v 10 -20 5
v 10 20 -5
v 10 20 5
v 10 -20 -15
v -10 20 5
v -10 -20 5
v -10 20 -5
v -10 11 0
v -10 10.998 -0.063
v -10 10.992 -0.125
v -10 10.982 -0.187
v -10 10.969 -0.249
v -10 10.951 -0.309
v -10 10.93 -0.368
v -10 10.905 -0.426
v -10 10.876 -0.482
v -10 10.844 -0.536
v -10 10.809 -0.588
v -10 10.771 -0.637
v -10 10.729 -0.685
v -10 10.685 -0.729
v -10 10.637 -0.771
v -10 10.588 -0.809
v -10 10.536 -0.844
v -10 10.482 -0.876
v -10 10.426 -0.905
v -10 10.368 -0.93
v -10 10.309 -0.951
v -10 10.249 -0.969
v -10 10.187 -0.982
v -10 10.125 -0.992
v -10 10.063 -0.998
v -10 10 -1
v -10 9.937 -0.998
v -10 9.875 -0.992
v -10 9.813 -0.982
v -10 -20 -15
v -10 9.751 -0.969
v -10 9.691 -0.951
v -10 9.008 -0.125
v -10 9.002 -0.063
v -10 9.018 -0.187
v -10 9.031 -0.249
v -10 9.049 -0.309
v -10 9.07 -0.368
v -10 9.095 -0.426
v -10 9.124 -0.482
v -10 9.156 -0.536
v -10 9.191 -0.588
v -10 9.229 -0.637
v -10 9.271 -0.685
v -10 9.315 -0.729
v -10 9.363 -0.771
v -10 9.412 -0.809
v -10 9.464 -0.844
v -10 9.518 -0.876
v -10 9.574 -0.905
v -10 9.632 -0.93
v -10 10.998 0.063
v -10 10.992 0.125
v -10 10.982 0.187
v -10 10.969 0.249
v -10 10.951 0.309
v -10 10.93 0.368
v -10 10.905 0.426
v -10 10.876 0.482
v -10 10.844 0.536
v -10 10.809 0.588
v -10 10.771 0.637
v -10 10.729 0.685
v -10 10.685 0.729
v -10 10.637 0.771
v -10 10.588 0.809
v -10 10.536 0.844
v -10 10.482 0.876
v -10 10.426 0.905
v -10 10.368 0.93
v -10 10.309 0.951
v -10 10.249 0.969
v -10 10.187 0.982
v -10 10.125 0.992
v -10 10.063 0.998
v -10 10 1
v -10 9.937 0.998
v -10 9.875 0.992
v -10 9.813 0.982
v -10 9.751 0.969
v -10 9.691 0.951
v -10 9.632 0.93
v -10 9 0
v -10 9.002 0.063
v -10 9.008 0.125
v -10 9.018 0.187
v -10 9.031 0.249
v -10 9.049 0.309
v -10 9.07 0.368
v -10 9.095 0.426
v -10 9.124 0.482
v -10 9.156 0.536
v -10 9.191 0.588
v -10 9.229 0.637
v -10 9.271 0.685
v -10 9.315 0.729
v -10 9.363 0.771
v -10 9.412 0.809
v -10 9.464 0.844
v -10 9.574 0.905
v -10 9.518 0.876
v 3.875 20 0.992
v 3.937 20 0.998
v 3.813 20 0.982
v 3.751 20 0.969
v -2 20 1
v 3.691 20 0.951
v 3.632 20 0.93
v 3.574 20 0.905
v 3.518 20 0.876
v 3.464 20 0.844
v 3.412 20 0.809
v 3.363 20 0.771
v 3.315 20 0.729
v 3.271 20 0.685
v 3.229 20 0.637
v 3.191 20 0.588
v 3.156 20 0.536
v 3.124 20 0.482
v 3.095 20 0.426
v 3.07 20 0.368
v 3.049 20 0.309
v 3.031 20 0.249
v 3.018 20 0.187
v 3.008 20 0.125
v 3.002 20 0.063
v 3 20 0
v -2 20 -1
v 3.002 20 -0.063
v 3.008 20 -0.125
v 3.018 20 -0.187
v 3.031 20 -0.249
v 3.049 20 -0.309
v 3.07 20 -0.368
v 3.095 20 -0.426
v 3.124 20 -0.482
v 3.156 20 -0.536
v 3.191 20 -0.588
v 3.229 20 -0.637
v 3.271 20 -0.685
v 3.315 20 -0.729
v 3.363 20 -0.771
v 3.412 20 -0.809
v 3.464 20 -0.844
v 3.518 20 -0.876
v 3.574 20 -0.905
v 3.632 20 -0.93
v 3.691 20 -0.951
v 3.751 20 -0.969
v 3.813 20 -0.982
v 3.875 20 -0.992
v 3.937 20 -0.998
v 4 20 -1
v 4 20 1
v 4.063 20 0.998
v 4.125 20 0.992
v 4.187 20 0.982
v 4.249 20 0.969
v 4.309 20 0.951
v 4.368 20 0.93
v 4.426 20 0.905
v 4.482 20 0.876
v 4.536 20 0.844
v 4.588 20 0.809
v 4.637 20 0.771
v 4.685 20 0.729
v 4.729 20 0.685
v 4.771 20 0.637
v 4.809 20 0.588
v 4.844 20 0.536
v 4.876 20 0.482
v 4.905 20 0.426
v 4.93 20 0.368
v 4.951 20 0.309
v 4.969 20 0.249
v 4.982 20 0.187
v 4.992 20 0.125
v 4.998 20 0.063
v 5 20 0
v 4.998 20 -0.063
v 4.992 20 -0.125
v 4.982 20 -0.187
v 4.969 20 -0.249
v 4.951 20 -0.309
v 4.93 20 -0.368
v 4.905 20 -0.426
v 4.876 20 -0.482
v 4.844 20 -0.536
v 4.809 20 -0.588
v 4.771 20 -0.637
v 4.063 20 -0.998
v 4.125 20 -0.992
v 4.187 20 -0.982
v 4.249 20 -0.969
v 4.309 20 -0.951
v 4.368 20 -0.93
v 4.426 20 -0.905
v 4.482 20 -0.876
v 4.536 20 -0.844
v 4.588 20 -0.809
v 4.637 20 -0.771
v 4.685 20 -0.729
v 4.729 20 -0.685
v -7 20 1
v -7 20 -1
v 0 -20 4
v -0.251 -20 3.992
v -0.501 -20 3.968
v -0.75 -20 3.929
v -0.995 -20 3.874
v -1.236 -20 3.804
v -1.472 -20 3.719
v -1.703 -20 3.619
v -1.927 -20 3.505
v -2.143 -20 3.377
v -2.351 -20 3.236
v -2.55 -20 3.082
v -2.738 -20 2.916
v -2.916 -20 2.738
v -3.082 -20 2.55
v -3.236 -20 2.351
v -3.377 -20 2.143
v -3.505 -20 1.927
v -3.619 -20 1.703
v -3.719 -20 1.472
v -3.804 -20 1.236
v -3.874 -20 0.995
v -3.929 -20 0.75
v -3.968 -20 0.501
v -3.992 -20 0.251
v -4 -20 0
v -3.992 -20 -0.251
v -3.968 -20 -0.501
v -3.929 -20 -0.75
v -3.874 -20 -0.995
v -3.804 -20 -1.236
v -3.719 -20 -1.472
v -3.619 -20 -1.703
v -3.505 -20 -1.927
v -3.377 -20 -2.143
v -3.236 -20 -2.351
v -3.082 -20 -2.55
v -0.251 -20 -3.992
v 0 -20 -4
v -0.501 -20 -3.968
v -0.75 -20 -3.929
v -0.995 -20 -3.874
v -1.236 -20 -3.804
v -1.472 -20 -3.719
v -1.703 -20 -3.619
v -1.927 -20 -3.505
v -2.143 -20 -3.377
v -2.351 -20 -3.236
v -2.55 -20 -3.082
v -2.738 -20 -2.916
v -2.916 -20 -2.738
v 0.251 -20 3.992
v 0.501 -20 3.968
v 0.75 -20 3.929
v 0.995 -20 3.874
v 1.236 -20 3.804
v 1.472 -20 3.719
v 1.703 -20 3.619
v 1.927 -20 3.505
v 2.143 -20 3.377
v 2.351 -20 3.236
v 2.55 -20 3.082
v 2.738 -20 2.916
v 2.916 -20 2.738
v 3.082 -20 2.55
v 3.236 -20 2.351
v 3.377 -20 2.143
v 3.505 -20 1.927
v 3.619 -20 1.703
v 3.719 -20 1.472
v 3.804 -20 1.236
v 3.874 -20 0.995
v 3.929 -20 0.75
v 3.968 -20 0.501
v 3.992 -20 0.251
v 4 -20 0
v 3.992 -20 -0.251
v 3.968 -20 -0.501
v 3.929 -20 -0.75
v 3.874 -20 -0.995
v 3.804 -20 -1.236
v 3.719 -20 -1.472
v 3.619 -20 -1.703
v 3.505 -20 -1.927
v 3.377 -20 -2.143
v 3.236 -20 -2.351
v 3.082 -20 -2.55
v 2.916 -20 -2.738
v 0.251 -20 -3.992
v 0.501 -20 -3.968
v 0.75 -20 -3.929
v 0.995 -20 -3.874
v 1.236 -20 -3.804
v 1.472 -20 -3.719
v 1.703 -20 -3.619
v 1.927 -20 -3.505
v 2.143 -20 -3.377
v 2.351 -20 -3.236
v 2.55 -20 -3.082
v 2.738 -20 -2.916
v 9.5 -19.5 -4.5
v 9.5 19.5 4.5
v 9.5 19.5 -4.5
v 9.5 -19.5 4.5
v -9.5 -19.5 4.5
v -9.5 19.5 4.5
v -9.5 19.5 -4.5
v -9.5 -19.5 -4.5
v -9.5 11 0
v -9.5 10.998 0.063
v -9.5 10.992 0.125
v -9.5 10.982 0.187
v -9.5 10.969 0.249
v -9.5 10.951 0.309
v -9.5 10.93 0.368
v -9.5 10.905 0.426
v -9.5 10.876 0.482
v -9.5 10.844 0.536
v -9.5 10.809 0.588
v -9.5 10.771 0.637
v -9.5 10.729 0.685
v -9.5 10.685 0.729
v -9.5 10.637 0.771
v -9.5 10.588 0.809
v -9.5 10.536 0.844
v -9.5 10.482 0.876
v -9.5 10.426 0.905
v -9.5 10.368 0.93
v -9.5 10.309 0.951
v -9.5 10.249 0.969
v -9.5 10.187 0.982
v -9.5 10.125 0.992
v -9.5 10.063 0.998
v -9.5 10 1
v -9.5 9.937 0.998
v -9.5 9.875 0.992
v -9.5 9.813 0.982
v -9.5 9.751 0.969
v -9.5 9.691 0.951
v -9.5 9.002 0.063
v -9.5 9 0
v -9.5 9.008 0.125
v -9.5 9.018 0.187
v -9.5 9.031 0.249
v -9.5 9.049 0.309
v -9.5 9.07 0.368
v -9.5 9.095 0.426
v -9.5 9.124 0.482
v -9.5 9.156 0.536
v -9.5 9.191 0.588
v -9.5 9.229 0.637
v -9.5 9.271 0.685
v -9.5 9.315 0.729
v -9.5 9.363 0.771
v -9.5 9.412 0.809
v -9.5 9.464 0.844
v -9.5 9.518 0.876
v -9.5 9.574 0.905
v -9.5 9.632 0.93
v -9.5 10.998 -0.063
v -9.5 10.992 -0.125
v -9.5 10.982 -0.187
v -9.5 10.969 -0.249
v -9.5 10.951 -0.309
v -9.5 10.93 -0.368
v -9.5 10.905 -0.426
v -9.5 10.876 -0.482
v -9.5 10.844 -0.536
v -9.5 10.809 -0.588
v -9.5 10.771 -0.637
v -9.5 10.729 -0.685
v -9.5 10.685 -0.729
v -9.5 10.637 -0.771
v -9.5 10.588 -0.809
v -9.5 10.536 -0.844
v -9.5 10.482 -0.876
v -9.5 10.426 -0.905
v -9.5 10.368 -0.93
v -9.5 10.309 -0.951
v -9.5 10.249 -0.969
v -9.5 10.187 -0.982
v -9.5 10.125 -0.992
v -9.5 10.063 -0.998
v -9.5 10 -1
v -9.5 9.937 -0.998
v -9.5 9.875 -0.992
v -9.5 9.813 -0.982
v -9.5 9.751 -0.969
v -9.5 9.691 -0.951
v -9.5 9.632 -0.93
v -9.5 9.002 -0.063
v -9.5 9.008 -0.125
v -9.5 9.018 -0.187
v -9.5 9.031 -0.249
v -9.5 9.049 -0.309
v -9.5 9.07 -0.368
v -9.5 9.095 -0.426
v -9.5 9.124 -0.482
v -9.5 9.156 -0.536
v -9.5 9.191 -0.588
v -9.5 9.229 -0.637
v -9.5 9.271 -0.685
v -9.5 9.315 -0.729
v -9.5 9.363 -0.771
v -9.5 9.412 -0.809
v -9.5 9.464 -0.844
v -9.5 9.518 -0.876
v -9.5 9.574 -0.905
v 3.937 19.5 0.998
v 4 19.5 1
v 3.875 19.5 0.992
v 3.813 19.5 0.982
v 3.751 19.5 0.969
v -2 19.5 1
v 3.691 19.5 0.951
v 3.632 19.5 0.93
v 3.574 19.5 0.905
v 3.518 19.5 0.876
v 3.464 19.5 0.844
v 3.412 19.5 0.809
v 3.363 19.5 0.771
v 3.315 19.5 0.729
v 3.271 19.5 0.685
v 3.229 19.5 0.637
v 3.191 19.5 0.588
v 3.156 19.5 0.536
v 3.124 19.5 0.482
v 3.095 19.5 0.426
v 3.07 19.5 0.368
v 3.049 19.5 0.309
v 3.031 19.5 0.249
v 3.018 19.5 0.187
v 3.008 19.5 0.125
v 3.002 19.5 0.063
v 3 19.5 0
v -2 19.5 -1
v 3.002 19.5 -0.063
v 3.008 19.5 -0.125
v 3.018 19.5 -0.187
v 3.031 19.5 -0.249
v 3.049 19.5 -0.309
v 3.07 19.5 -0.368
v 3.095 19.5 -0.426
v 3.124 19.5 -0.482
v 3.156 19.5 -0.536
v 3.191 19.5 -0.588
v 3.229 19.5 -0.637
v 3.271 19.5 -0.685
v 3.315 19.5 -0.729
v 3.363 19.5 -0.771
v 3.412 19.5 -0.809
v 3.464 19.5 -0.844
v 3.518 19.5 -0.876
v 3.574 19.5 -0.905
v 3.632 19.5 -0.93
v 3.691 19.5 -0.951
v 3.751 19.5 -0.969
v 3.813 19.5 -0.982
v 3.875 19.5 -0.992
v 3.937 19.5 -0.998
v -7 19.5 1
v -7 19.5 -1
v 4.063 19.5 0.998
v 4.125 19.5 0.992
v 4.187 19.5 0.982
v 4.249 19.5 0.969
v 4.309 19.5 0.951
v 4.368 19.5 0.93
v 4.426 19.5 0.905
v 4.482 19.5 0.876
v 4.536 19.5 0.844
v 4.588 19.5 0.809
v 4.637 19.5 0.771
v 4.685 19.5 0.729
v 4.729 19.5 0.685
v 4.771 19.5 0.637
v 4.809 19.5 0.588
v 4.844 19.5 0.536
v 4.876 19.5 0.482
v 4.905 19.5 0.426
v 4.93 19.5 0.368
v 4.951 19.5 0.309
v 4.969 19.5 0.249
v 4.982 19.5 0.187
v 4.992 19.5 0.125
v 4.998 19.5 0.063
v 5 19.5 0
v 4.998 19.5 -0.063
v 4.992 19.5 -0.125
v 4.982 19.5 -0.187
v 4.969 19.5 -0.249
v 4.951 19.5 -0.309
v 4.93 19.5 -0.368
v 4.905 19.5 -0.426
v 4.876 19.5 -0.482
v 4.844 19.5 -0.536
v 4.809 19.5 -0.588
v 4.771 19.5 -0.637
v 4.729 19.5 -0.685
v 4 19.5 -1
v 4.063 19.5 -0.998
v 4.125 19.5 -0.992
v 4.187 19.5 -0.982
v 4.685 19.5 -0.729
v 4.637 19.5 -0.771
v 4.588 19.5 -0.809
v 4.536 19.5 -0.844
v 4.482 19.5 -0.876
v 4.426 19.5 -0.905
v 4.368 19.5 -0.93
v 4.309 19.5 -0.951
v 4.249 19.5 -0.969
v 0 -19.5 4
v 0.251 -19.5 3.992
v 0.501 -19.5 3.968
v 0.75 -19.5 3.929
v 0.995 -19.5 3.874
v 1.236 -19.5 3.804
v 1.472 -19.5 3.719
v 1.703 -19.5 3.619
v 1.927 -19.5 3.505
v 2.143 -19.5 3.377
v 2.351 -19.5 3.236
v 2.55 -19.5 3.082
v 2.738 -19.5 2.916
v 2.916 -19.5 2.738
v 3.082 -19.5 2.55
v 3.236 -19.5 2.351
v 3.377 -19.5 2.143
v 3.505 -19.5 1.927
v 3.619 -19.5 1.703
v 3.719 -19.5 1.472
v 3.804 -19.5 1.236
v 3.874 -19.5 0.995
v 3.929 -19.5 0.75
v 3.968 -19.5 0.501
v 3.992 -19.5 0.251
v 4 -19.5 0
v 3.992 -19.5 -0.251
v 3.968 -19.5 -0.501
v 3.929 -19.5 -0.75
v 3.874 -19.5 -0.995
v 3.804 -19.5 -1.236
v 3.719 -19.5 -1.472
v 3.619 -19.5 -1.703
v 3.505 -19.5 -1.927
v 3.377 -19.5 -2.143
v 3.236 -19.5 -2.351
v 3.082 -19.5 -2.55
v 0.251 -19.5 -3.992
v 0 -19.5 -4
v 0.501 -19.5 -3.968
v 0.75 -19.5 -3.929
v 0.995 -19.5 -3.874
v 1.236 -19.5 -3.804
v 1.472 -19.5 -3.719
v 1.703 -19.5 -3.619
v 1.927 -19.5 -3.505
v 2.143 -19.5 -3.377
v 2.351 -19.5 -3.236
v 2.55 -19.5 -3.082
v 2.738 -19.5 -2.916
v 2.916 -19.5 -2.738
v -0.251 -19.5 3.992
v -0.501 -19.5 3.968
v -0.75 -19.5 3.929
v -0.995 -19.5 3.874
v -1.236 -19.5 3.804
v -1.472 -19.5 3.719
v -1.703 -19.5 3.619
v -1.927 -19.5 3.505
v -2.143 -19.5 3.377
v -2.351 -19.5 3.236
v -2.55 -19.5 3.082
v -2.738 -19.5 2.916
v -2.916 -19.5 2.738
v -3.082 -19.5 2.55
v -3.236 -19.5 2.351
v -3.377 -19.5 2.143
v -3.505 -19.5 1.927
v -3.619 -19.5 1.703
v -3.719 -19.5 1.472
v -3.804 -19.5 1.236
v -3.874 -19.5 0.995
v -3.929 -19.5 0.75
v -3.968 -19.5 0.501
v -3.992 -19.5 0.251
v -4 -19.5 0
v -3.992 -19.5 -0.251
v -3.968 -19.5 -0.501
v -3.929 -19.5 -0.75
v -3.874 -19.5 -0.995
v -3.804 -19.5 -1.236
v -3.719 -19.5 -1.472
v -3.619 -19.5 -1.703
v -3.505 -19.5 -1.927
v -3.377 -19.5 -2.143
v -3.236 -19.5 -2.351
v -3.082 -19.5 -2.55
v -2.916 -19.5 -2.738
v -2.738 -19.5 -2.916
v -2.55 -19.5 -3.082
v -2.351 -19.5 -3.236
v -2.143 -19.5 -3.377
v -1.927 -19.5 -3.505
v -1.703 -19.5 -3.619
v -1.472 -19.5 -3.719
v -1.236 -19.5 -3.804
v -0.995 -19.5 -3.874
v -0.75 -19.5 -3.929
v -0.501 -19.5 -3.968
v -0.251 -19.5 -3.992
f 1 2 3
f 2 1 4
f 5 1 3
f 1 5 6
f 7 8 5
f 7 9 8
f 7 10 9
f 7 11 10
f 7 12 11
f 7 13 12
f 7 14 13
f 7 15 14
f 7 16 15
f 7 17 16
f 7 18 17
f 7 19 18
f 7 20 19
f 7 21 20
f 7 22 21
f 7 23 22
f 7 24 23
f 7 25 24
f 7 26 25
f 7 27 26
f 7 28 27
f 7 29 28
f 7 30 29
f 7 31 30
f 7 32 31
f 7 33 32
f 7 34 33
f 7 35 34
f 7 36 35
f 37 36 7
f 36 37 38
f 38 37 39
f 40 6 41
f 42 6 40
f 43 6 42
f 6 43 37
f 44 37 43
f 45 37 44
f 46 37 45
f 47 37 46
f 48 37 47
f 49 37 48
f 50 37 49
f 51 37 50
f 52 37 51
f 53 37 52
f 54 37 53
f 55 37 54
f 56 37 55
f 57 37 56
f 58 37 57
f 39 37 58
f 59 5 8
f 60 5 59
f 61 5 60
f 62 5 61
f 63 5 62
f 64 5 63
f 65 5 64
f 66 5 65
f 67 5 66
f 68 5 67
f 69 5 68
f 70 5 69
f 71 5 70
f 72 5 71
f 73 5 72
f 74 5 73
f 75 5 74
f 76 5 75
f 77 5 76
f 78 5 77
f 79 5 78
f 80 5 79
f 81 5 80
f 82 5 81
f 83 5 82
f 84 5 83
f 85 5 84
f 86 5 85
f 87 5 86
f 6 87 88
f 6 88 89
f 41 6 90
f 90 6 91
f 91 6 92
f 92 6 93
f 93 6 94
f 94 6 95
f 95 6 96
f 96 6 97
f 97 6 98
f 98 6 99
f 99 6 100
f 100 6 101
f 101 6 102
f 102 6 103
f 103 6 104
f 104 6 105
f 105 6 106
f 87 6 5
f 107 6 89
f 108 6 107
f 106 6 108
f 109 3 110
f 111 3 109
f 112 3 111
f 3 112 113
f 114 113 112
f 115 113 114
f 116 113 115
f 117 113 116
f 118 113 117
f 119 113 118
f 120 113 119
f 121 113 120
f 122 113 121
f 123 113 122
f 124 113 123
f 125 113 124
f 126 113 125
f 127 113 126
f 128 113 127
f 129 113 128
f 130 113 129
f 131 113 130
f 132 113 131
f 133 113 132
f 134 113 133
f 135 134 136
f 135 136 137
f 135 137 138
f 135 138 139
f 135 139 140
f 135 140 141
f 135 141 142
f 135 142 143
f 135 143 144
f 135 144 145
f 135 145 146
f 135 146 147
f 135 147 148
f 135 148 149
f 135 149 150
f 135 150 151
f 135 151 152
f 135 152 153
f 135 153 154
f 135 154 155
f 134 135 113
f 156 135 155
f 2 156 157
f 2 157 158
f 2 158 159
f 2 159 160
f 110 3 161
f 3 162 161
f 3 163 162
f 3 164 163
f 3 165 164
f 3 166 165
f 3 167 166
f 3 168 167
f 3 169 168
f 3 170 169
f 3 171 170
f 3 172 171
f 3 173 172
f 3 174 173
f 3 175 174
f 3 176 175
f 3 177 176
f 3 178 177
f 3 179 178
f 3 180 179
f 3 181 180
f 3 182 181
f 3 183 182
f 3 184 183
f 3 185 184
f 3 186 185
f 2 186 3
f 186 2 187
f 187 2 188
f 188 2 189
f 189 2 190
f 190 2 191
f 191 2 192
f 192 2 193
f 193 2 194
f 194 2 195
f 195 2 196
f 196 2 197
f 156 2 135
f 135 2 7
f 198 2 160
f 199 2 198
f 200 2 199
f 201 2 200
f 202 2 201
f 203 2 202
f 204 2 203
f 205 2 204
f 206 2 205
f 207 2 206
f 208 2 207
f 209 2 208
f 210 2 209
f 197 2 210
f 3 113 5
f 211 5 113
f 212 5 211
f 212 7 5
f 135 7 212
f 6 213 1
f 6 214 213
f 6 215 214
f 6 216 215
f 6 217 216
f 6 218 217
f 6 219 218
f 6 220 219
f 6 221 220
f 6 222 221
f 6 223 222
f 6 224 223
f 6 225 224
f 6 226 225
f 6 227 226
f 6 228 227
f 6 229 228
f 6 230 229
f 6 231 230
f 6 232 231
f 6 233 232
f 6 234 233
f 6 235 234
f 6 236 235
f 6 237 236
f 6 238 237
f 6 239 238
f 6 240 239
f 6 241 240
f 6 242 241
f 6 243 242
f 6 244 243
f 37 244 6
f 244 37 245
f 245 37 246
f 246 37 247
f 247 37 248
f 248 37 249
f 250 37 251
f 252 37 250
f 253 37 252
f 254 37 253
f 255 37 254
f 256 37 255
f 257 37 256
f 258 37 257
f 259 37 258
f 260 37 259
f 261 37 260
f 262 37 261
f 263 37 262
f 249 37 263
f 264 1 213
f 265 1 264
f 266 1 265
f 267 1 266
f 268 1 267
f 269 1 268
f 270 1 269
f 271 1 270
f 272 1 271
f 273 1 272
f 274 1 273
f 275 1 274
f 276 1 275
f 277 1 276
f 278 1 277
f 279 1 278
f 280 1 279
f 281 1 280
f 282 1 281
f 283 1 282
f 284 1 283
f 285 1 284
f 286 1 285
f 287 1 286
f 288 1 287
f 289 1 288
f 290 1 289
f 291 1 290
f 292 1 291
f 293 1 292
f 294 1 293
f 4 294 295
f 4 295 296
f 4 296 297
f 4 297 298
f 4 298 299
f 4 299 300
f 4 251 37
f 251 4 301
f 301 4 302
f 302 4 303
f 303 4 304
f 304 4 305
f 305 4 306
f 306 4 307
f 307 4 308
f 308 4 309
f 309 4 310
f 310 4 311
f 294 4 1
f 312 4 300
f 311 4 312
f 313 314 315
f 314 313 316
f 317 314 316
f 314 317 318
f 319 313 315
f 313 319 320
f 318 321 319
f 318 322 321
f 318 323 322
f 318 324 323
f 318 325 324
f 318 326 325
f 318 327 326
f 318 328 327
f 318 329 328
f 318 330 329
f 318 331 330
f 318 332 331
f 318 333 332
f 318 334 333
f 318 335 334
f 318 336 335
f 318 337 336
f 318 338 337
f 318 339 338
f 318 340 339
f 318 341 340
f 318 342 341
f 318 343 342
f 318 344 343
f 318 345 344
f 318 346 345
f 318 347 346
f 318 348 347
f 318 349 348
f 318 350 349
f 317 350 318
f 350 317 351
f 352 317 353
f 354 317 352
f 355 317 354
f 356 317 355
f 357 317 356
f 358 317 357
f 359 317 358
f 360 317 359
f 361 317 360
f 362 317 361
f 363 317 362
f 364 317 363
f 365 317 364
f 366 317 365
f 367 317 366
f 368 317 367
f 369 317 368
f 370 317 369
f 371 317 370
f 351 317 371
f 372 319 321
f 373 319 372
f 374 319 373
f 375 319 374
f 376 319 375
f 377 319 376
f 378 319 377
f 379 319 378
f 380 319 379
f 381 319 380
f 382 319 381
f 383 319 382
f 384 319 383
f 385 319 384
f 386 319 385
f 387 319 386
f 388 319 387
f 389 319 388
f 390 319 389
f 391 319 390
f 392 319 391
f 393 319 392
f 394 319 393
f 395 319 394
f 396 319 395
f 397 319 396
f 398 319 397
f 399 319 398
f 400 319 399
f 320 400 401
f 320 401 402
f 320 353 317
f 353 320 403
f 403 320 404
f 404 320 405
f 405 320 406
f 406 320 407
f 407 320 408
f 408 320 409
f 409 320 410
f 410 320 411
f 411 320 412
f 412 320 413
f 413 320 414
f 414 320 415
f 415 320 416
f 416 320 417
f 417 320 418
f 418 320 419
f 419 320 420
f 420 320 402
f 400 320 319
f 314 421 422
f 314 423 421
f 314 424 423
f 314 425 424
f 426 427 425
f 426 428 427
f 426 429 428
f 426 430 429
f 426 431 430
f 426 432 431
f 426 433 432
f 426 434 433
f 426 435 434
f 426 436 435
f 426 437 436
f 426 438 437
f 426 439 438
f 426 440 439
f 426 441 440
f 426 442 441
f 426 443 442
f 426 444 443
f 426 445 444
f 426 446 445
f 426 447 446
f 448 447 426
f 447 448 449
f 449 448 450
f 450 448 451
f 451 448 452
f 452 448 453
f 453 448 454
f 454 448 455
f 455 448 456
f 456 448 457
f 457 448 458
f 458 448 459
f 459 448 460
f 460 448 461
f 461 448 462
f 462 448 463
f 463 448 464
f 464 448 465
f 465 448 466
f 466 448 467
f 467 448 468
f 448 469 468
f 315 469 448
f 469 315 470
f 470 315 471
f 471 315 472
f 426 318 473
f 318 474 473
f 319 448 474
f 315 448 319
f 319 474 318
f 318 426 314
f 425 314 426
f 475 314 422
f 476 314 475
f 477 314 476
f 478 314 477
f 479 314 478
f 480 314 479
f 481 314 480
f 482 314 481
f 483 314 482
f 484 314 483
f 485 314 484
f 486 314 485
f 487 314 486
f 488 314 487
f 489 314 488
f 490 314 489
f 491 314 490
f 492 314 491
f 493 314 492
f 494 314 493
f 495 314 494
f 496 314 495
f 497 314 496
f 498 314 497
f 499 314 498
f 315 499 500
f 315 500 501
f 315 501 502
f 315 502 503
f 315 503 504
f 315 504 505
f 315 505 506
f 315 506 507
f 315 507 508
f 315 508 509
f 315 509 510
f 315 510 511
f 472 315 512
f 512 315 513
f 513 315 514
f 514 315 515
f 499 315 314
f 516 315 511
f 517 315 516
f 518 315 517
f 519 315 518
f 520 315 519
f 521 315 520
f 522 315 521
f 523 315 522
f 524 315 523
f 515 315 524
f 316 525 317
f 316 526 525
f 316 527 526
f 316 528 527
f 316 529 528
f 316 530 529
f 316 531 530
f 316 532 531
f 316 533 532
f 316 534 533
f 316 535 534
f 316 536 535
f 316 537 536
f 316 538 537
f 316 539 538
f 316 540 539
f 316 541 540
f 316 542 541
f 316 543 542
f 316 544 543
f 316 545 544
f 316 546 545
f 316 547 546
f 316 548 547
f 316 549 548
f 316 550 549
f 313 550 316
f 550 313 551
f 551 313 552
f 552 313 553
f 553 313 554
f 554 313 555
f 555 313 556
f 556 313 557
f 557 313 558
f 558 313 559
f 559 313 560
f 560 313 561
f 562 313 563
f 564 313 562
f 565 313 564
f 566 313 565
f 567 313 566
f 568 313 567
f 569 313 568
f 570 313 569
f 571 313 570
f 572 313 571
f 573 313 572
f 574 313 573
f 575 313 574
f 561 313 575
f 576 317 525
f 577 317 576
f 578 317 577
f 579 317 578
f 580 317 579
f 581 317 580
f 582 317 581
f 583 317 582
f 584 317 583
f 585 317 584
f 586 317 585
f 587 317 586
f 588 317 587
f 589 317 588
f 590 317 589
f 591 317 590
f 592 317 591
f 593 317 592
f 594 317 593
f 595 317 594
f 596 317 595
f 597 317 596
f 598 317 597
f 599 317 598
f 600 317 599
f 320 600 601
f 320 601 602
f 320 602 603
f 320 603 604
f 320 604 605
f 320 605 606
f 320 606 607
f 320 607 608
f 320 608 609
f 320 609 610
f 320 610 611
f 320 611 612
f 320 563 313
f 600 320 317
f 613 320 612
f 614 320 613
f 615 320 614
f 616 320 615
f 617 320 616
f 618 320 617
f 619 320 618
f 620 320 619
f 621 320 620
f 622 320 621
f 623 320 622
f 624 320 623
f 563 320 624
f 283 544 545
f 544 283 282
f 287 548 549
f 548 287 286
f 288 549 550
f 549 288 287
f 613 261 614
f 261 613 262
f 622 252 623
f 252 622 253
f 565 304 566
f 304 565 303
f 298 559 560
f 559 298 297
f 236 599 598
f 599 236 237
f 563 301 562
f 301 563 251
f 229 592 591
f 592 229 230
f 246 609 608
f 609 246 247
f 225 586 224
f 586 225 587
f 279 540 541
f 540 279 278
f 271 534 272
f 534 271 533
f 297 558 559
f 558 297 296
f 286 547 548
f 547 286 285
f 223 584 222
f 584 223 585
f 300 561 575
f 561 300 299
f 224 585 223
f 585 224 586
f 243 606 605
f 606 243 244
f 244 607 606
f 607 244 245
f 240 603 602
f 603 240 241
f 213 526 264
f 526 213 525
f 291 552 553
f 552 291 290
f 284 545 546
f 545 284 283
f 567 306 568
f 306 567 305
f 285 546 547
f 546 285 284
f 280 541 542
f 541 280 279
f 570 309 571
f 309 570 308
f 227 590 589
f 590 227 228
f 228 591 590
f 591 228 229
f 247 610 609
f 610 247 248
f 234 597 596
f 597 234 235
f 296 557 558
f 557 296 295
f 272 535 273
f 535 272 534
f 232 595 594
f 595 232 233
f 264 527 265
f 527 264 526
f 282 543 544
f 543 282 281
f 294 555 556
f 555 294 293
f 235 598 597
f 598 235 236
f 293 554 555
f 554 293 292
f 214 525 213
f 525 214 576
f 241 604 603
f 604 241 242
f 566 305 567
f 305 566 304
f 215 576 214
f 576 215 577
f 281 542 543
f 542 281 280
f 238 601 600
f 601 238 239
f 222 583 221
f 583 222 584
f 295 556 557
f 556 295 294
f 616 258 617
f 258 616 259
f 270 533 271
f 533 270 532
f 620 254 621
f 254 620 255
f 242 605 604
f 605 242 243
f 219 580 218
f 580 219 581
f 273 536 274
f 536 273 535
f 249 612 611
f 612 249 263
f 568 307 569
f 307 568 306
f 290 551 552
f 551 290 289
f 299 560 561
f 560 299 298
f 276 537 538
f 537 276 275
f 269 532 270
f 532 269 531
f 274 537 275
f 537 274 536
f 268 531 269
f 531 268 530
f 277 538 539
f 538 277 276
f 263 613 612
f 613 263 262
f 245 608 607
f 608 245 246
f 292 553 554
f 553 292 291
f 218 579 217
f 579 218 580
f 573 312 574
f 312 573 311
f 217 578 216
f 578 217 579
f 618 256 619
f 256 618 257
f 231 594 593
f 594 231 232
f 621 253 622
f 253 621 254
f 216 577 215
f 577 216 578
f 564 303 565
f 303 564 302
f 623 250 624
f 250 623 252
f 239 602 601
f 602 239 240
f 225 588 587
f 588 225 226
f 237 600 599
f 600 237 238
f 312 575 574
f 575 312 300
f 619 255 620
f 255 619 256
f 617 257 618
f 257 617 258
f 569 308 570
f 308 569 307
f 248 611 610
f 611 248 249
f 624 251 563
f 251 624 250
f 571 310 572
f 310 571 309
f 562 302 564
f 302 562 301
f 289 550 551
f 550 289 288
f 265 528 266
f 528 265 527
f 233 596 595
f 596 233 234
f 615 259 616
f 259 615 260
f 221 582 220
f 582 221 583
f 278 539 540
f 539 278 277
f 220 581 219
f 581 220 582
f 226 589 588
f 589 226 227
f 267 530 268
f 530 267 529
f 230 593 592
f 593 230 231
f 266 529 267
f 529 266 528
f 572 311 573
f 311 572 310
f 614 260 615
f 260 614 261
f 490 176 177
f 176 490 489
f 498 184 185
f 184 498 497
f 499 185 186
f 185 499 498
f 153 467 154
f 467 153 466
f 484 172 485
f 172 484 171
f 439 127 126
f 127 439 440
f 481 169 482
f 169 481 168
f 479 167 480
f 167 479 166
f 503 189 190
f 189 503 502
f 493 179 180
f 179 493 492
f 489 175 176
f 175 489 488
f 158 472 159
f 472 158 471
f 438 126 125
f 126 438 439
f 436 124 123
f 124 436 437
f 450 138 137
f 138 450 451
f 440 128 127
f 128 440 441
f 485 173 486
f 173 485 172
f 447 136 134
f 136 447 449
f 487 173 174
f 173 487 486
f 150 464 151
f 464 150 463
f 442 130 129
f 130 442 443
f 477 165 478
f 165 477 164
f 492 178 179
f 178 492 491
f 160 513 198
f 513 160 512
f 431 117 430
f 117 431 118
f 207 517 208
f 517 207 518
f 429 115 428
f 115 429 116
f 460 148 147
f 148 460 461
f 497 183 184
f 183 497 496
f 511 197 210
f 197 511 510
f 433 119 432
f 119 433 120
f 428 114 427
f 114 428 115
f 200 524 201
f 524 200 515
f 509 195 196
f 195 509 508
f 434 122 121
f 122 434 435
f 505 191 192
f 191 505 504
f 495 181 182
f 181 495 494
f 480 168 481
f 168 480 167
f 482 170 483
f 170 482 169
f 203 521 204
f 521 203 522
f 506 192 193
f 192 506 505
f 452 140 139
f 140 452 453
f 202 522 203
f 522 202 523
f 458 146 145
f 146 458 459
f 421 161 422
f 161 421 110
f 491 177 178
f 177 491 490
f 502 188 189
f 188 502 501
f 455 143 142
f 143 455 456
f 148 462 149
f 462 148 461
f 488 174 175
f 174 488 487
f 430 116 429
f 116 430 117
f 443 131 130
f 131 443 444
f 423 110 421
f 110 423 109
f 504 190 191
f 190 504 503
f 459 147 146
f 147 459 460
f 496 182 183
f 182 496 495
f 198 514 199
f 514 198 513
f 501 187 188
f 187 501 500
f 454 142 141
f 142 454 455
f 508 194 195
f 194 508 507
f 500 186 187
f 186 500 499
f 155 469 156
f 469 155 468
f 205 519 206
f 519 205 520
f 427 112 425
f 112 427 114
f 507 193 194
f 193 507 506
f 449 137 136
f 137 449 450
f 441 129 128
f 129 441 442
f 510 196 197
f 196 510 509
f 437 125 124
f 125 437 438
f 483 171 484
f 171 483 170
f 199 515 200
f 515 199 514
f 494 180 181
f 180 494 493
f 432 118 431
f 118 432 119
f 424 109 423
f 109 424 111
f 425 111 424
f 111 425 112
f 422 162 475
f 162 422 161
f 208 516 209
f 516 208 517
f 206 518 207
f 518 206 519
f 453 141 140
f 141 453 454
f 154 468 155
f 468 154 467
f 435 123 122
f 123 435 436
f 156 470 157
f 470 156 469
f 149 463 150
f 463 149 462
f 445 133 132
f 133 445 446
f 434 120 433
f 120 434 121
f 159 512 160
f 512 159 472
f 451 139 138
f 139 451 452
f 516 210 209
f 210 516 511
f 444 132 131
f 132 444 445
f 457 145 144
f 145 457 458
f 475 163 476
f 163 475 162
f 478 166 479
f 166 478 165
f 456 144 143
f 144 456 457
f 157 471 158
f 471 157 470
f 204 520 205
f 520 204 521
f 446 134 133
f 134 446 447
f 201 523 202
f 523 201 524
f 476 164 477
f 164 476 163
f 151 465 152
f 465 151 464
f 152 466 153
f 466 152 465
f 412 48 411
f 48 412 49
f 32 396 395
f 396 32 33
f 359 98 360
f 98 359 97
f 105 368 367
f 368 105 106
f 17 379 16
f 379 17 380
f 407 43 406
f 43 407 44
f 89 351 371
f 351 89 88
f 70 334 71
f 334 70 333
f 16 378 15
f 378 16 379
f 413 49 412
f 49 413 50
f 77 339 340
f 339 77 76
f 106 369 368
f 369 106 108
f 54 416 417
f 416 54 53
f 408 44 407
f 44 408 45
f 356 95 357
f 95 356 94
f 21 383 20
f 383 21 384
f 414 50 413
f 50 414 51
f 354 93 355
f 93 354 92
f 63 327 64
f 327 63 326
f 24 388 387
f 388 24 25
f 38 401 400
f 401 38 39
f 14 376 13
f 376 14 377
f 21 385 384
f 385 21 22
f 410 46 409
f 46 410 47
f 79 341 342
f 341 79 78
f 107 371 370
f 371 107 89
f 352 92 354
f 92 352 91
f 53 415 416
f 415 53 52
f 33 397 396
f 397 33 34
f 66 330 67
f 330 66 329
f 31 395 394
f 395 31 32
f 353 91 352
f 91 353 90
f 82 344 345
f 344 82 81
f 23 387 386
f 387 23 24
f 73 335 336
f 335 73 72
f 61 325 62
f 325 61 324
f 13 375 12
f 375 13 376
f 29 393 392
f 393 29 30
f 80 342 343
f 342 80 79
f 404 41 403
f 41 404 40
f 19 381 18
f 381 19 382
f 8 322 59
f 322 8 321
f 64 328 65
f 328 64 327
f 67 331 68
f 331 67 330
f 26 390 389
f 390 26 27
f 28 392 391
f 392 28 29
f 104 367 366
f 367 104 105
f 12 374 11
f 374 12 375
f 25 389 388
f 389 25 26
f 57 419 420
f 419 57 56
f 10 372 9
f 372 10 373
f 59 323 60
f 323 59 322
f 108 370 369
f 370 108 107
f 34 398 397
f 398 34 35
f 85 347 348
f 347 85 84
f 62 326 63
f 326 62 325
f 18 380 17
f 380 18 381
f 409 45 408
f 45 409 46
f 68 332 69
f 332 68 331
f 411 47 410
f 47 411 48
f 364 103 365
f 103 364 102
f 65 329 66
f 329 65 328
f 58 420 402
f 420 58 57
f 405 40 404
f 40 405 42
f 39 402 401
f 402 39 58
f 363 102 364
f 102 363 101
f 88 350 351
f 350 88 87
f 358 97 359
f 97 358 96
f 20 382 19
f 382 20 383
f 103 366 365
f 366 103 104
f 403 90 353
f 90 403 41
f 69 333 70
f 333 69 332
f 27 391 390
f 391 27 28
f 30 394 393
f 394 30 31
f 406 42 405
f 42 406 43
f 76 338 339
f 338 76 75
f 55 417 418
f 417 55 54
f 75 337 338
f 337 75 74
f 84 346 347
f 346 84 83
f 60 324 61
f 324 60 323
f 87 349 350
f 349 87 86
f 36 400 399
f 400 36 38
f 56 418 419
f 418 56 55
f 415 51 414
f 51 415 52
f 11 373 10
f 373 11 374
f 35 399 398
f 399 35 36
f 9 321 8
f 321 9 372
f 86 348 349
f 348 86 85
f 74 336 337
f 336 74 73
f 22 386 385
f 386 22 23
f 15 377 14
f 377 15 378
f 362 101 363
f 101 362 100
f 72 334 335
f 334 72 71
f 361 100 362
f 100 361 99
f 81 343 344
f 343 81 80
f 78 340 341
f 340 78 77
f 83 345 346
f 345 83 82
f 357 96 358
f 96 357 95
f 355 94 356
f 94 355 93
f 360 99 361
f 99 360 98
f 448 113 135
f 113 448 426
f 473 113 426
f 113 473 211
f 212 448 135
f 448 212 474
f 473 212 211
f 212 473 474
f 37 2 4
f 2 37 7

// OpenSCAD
module triangle(l, w, h) {
	translate([0, l, 0]) rotate( a= [90, 0, 0]) 
	linear_extrude(height = l) polygon(points = [
		[0, 0],
		[w, 0],
		[0, h]
	], paths=[[0,1,2,0]]);
}


module box() {
difference() {
difference() {
    cube(size = [20,40,10], center = true);
    cube(size = [19,39,9], center = true);
    translate([0,-17,0]) { rotate ([90,0,0]) cylinder(h = 10, r = 4, $fn=100); } //distance sensor
    translate([4,21,0]) { rotate ([90,0,0]) cylinder(h = 4, r = 1, $fn=100); } //charging
    translate([-11,10,0]) { rotate ([0,90,0]) cylinder(h = 3, r = 1, $fn=100); } //vibrator
    translate([-7,17,-1]) {cube(size = [5,4,2]); }
}
  translate([-12,-21,0]) { cube(size = [25,45,-6]); }
}}

union() {
    box();
    translate([-10,-20,-5]) {
        rotate(a=[180,0,180]) { rotate ([0, 0, 90]) { triangle(20, 40, 10); } }
    }
}
